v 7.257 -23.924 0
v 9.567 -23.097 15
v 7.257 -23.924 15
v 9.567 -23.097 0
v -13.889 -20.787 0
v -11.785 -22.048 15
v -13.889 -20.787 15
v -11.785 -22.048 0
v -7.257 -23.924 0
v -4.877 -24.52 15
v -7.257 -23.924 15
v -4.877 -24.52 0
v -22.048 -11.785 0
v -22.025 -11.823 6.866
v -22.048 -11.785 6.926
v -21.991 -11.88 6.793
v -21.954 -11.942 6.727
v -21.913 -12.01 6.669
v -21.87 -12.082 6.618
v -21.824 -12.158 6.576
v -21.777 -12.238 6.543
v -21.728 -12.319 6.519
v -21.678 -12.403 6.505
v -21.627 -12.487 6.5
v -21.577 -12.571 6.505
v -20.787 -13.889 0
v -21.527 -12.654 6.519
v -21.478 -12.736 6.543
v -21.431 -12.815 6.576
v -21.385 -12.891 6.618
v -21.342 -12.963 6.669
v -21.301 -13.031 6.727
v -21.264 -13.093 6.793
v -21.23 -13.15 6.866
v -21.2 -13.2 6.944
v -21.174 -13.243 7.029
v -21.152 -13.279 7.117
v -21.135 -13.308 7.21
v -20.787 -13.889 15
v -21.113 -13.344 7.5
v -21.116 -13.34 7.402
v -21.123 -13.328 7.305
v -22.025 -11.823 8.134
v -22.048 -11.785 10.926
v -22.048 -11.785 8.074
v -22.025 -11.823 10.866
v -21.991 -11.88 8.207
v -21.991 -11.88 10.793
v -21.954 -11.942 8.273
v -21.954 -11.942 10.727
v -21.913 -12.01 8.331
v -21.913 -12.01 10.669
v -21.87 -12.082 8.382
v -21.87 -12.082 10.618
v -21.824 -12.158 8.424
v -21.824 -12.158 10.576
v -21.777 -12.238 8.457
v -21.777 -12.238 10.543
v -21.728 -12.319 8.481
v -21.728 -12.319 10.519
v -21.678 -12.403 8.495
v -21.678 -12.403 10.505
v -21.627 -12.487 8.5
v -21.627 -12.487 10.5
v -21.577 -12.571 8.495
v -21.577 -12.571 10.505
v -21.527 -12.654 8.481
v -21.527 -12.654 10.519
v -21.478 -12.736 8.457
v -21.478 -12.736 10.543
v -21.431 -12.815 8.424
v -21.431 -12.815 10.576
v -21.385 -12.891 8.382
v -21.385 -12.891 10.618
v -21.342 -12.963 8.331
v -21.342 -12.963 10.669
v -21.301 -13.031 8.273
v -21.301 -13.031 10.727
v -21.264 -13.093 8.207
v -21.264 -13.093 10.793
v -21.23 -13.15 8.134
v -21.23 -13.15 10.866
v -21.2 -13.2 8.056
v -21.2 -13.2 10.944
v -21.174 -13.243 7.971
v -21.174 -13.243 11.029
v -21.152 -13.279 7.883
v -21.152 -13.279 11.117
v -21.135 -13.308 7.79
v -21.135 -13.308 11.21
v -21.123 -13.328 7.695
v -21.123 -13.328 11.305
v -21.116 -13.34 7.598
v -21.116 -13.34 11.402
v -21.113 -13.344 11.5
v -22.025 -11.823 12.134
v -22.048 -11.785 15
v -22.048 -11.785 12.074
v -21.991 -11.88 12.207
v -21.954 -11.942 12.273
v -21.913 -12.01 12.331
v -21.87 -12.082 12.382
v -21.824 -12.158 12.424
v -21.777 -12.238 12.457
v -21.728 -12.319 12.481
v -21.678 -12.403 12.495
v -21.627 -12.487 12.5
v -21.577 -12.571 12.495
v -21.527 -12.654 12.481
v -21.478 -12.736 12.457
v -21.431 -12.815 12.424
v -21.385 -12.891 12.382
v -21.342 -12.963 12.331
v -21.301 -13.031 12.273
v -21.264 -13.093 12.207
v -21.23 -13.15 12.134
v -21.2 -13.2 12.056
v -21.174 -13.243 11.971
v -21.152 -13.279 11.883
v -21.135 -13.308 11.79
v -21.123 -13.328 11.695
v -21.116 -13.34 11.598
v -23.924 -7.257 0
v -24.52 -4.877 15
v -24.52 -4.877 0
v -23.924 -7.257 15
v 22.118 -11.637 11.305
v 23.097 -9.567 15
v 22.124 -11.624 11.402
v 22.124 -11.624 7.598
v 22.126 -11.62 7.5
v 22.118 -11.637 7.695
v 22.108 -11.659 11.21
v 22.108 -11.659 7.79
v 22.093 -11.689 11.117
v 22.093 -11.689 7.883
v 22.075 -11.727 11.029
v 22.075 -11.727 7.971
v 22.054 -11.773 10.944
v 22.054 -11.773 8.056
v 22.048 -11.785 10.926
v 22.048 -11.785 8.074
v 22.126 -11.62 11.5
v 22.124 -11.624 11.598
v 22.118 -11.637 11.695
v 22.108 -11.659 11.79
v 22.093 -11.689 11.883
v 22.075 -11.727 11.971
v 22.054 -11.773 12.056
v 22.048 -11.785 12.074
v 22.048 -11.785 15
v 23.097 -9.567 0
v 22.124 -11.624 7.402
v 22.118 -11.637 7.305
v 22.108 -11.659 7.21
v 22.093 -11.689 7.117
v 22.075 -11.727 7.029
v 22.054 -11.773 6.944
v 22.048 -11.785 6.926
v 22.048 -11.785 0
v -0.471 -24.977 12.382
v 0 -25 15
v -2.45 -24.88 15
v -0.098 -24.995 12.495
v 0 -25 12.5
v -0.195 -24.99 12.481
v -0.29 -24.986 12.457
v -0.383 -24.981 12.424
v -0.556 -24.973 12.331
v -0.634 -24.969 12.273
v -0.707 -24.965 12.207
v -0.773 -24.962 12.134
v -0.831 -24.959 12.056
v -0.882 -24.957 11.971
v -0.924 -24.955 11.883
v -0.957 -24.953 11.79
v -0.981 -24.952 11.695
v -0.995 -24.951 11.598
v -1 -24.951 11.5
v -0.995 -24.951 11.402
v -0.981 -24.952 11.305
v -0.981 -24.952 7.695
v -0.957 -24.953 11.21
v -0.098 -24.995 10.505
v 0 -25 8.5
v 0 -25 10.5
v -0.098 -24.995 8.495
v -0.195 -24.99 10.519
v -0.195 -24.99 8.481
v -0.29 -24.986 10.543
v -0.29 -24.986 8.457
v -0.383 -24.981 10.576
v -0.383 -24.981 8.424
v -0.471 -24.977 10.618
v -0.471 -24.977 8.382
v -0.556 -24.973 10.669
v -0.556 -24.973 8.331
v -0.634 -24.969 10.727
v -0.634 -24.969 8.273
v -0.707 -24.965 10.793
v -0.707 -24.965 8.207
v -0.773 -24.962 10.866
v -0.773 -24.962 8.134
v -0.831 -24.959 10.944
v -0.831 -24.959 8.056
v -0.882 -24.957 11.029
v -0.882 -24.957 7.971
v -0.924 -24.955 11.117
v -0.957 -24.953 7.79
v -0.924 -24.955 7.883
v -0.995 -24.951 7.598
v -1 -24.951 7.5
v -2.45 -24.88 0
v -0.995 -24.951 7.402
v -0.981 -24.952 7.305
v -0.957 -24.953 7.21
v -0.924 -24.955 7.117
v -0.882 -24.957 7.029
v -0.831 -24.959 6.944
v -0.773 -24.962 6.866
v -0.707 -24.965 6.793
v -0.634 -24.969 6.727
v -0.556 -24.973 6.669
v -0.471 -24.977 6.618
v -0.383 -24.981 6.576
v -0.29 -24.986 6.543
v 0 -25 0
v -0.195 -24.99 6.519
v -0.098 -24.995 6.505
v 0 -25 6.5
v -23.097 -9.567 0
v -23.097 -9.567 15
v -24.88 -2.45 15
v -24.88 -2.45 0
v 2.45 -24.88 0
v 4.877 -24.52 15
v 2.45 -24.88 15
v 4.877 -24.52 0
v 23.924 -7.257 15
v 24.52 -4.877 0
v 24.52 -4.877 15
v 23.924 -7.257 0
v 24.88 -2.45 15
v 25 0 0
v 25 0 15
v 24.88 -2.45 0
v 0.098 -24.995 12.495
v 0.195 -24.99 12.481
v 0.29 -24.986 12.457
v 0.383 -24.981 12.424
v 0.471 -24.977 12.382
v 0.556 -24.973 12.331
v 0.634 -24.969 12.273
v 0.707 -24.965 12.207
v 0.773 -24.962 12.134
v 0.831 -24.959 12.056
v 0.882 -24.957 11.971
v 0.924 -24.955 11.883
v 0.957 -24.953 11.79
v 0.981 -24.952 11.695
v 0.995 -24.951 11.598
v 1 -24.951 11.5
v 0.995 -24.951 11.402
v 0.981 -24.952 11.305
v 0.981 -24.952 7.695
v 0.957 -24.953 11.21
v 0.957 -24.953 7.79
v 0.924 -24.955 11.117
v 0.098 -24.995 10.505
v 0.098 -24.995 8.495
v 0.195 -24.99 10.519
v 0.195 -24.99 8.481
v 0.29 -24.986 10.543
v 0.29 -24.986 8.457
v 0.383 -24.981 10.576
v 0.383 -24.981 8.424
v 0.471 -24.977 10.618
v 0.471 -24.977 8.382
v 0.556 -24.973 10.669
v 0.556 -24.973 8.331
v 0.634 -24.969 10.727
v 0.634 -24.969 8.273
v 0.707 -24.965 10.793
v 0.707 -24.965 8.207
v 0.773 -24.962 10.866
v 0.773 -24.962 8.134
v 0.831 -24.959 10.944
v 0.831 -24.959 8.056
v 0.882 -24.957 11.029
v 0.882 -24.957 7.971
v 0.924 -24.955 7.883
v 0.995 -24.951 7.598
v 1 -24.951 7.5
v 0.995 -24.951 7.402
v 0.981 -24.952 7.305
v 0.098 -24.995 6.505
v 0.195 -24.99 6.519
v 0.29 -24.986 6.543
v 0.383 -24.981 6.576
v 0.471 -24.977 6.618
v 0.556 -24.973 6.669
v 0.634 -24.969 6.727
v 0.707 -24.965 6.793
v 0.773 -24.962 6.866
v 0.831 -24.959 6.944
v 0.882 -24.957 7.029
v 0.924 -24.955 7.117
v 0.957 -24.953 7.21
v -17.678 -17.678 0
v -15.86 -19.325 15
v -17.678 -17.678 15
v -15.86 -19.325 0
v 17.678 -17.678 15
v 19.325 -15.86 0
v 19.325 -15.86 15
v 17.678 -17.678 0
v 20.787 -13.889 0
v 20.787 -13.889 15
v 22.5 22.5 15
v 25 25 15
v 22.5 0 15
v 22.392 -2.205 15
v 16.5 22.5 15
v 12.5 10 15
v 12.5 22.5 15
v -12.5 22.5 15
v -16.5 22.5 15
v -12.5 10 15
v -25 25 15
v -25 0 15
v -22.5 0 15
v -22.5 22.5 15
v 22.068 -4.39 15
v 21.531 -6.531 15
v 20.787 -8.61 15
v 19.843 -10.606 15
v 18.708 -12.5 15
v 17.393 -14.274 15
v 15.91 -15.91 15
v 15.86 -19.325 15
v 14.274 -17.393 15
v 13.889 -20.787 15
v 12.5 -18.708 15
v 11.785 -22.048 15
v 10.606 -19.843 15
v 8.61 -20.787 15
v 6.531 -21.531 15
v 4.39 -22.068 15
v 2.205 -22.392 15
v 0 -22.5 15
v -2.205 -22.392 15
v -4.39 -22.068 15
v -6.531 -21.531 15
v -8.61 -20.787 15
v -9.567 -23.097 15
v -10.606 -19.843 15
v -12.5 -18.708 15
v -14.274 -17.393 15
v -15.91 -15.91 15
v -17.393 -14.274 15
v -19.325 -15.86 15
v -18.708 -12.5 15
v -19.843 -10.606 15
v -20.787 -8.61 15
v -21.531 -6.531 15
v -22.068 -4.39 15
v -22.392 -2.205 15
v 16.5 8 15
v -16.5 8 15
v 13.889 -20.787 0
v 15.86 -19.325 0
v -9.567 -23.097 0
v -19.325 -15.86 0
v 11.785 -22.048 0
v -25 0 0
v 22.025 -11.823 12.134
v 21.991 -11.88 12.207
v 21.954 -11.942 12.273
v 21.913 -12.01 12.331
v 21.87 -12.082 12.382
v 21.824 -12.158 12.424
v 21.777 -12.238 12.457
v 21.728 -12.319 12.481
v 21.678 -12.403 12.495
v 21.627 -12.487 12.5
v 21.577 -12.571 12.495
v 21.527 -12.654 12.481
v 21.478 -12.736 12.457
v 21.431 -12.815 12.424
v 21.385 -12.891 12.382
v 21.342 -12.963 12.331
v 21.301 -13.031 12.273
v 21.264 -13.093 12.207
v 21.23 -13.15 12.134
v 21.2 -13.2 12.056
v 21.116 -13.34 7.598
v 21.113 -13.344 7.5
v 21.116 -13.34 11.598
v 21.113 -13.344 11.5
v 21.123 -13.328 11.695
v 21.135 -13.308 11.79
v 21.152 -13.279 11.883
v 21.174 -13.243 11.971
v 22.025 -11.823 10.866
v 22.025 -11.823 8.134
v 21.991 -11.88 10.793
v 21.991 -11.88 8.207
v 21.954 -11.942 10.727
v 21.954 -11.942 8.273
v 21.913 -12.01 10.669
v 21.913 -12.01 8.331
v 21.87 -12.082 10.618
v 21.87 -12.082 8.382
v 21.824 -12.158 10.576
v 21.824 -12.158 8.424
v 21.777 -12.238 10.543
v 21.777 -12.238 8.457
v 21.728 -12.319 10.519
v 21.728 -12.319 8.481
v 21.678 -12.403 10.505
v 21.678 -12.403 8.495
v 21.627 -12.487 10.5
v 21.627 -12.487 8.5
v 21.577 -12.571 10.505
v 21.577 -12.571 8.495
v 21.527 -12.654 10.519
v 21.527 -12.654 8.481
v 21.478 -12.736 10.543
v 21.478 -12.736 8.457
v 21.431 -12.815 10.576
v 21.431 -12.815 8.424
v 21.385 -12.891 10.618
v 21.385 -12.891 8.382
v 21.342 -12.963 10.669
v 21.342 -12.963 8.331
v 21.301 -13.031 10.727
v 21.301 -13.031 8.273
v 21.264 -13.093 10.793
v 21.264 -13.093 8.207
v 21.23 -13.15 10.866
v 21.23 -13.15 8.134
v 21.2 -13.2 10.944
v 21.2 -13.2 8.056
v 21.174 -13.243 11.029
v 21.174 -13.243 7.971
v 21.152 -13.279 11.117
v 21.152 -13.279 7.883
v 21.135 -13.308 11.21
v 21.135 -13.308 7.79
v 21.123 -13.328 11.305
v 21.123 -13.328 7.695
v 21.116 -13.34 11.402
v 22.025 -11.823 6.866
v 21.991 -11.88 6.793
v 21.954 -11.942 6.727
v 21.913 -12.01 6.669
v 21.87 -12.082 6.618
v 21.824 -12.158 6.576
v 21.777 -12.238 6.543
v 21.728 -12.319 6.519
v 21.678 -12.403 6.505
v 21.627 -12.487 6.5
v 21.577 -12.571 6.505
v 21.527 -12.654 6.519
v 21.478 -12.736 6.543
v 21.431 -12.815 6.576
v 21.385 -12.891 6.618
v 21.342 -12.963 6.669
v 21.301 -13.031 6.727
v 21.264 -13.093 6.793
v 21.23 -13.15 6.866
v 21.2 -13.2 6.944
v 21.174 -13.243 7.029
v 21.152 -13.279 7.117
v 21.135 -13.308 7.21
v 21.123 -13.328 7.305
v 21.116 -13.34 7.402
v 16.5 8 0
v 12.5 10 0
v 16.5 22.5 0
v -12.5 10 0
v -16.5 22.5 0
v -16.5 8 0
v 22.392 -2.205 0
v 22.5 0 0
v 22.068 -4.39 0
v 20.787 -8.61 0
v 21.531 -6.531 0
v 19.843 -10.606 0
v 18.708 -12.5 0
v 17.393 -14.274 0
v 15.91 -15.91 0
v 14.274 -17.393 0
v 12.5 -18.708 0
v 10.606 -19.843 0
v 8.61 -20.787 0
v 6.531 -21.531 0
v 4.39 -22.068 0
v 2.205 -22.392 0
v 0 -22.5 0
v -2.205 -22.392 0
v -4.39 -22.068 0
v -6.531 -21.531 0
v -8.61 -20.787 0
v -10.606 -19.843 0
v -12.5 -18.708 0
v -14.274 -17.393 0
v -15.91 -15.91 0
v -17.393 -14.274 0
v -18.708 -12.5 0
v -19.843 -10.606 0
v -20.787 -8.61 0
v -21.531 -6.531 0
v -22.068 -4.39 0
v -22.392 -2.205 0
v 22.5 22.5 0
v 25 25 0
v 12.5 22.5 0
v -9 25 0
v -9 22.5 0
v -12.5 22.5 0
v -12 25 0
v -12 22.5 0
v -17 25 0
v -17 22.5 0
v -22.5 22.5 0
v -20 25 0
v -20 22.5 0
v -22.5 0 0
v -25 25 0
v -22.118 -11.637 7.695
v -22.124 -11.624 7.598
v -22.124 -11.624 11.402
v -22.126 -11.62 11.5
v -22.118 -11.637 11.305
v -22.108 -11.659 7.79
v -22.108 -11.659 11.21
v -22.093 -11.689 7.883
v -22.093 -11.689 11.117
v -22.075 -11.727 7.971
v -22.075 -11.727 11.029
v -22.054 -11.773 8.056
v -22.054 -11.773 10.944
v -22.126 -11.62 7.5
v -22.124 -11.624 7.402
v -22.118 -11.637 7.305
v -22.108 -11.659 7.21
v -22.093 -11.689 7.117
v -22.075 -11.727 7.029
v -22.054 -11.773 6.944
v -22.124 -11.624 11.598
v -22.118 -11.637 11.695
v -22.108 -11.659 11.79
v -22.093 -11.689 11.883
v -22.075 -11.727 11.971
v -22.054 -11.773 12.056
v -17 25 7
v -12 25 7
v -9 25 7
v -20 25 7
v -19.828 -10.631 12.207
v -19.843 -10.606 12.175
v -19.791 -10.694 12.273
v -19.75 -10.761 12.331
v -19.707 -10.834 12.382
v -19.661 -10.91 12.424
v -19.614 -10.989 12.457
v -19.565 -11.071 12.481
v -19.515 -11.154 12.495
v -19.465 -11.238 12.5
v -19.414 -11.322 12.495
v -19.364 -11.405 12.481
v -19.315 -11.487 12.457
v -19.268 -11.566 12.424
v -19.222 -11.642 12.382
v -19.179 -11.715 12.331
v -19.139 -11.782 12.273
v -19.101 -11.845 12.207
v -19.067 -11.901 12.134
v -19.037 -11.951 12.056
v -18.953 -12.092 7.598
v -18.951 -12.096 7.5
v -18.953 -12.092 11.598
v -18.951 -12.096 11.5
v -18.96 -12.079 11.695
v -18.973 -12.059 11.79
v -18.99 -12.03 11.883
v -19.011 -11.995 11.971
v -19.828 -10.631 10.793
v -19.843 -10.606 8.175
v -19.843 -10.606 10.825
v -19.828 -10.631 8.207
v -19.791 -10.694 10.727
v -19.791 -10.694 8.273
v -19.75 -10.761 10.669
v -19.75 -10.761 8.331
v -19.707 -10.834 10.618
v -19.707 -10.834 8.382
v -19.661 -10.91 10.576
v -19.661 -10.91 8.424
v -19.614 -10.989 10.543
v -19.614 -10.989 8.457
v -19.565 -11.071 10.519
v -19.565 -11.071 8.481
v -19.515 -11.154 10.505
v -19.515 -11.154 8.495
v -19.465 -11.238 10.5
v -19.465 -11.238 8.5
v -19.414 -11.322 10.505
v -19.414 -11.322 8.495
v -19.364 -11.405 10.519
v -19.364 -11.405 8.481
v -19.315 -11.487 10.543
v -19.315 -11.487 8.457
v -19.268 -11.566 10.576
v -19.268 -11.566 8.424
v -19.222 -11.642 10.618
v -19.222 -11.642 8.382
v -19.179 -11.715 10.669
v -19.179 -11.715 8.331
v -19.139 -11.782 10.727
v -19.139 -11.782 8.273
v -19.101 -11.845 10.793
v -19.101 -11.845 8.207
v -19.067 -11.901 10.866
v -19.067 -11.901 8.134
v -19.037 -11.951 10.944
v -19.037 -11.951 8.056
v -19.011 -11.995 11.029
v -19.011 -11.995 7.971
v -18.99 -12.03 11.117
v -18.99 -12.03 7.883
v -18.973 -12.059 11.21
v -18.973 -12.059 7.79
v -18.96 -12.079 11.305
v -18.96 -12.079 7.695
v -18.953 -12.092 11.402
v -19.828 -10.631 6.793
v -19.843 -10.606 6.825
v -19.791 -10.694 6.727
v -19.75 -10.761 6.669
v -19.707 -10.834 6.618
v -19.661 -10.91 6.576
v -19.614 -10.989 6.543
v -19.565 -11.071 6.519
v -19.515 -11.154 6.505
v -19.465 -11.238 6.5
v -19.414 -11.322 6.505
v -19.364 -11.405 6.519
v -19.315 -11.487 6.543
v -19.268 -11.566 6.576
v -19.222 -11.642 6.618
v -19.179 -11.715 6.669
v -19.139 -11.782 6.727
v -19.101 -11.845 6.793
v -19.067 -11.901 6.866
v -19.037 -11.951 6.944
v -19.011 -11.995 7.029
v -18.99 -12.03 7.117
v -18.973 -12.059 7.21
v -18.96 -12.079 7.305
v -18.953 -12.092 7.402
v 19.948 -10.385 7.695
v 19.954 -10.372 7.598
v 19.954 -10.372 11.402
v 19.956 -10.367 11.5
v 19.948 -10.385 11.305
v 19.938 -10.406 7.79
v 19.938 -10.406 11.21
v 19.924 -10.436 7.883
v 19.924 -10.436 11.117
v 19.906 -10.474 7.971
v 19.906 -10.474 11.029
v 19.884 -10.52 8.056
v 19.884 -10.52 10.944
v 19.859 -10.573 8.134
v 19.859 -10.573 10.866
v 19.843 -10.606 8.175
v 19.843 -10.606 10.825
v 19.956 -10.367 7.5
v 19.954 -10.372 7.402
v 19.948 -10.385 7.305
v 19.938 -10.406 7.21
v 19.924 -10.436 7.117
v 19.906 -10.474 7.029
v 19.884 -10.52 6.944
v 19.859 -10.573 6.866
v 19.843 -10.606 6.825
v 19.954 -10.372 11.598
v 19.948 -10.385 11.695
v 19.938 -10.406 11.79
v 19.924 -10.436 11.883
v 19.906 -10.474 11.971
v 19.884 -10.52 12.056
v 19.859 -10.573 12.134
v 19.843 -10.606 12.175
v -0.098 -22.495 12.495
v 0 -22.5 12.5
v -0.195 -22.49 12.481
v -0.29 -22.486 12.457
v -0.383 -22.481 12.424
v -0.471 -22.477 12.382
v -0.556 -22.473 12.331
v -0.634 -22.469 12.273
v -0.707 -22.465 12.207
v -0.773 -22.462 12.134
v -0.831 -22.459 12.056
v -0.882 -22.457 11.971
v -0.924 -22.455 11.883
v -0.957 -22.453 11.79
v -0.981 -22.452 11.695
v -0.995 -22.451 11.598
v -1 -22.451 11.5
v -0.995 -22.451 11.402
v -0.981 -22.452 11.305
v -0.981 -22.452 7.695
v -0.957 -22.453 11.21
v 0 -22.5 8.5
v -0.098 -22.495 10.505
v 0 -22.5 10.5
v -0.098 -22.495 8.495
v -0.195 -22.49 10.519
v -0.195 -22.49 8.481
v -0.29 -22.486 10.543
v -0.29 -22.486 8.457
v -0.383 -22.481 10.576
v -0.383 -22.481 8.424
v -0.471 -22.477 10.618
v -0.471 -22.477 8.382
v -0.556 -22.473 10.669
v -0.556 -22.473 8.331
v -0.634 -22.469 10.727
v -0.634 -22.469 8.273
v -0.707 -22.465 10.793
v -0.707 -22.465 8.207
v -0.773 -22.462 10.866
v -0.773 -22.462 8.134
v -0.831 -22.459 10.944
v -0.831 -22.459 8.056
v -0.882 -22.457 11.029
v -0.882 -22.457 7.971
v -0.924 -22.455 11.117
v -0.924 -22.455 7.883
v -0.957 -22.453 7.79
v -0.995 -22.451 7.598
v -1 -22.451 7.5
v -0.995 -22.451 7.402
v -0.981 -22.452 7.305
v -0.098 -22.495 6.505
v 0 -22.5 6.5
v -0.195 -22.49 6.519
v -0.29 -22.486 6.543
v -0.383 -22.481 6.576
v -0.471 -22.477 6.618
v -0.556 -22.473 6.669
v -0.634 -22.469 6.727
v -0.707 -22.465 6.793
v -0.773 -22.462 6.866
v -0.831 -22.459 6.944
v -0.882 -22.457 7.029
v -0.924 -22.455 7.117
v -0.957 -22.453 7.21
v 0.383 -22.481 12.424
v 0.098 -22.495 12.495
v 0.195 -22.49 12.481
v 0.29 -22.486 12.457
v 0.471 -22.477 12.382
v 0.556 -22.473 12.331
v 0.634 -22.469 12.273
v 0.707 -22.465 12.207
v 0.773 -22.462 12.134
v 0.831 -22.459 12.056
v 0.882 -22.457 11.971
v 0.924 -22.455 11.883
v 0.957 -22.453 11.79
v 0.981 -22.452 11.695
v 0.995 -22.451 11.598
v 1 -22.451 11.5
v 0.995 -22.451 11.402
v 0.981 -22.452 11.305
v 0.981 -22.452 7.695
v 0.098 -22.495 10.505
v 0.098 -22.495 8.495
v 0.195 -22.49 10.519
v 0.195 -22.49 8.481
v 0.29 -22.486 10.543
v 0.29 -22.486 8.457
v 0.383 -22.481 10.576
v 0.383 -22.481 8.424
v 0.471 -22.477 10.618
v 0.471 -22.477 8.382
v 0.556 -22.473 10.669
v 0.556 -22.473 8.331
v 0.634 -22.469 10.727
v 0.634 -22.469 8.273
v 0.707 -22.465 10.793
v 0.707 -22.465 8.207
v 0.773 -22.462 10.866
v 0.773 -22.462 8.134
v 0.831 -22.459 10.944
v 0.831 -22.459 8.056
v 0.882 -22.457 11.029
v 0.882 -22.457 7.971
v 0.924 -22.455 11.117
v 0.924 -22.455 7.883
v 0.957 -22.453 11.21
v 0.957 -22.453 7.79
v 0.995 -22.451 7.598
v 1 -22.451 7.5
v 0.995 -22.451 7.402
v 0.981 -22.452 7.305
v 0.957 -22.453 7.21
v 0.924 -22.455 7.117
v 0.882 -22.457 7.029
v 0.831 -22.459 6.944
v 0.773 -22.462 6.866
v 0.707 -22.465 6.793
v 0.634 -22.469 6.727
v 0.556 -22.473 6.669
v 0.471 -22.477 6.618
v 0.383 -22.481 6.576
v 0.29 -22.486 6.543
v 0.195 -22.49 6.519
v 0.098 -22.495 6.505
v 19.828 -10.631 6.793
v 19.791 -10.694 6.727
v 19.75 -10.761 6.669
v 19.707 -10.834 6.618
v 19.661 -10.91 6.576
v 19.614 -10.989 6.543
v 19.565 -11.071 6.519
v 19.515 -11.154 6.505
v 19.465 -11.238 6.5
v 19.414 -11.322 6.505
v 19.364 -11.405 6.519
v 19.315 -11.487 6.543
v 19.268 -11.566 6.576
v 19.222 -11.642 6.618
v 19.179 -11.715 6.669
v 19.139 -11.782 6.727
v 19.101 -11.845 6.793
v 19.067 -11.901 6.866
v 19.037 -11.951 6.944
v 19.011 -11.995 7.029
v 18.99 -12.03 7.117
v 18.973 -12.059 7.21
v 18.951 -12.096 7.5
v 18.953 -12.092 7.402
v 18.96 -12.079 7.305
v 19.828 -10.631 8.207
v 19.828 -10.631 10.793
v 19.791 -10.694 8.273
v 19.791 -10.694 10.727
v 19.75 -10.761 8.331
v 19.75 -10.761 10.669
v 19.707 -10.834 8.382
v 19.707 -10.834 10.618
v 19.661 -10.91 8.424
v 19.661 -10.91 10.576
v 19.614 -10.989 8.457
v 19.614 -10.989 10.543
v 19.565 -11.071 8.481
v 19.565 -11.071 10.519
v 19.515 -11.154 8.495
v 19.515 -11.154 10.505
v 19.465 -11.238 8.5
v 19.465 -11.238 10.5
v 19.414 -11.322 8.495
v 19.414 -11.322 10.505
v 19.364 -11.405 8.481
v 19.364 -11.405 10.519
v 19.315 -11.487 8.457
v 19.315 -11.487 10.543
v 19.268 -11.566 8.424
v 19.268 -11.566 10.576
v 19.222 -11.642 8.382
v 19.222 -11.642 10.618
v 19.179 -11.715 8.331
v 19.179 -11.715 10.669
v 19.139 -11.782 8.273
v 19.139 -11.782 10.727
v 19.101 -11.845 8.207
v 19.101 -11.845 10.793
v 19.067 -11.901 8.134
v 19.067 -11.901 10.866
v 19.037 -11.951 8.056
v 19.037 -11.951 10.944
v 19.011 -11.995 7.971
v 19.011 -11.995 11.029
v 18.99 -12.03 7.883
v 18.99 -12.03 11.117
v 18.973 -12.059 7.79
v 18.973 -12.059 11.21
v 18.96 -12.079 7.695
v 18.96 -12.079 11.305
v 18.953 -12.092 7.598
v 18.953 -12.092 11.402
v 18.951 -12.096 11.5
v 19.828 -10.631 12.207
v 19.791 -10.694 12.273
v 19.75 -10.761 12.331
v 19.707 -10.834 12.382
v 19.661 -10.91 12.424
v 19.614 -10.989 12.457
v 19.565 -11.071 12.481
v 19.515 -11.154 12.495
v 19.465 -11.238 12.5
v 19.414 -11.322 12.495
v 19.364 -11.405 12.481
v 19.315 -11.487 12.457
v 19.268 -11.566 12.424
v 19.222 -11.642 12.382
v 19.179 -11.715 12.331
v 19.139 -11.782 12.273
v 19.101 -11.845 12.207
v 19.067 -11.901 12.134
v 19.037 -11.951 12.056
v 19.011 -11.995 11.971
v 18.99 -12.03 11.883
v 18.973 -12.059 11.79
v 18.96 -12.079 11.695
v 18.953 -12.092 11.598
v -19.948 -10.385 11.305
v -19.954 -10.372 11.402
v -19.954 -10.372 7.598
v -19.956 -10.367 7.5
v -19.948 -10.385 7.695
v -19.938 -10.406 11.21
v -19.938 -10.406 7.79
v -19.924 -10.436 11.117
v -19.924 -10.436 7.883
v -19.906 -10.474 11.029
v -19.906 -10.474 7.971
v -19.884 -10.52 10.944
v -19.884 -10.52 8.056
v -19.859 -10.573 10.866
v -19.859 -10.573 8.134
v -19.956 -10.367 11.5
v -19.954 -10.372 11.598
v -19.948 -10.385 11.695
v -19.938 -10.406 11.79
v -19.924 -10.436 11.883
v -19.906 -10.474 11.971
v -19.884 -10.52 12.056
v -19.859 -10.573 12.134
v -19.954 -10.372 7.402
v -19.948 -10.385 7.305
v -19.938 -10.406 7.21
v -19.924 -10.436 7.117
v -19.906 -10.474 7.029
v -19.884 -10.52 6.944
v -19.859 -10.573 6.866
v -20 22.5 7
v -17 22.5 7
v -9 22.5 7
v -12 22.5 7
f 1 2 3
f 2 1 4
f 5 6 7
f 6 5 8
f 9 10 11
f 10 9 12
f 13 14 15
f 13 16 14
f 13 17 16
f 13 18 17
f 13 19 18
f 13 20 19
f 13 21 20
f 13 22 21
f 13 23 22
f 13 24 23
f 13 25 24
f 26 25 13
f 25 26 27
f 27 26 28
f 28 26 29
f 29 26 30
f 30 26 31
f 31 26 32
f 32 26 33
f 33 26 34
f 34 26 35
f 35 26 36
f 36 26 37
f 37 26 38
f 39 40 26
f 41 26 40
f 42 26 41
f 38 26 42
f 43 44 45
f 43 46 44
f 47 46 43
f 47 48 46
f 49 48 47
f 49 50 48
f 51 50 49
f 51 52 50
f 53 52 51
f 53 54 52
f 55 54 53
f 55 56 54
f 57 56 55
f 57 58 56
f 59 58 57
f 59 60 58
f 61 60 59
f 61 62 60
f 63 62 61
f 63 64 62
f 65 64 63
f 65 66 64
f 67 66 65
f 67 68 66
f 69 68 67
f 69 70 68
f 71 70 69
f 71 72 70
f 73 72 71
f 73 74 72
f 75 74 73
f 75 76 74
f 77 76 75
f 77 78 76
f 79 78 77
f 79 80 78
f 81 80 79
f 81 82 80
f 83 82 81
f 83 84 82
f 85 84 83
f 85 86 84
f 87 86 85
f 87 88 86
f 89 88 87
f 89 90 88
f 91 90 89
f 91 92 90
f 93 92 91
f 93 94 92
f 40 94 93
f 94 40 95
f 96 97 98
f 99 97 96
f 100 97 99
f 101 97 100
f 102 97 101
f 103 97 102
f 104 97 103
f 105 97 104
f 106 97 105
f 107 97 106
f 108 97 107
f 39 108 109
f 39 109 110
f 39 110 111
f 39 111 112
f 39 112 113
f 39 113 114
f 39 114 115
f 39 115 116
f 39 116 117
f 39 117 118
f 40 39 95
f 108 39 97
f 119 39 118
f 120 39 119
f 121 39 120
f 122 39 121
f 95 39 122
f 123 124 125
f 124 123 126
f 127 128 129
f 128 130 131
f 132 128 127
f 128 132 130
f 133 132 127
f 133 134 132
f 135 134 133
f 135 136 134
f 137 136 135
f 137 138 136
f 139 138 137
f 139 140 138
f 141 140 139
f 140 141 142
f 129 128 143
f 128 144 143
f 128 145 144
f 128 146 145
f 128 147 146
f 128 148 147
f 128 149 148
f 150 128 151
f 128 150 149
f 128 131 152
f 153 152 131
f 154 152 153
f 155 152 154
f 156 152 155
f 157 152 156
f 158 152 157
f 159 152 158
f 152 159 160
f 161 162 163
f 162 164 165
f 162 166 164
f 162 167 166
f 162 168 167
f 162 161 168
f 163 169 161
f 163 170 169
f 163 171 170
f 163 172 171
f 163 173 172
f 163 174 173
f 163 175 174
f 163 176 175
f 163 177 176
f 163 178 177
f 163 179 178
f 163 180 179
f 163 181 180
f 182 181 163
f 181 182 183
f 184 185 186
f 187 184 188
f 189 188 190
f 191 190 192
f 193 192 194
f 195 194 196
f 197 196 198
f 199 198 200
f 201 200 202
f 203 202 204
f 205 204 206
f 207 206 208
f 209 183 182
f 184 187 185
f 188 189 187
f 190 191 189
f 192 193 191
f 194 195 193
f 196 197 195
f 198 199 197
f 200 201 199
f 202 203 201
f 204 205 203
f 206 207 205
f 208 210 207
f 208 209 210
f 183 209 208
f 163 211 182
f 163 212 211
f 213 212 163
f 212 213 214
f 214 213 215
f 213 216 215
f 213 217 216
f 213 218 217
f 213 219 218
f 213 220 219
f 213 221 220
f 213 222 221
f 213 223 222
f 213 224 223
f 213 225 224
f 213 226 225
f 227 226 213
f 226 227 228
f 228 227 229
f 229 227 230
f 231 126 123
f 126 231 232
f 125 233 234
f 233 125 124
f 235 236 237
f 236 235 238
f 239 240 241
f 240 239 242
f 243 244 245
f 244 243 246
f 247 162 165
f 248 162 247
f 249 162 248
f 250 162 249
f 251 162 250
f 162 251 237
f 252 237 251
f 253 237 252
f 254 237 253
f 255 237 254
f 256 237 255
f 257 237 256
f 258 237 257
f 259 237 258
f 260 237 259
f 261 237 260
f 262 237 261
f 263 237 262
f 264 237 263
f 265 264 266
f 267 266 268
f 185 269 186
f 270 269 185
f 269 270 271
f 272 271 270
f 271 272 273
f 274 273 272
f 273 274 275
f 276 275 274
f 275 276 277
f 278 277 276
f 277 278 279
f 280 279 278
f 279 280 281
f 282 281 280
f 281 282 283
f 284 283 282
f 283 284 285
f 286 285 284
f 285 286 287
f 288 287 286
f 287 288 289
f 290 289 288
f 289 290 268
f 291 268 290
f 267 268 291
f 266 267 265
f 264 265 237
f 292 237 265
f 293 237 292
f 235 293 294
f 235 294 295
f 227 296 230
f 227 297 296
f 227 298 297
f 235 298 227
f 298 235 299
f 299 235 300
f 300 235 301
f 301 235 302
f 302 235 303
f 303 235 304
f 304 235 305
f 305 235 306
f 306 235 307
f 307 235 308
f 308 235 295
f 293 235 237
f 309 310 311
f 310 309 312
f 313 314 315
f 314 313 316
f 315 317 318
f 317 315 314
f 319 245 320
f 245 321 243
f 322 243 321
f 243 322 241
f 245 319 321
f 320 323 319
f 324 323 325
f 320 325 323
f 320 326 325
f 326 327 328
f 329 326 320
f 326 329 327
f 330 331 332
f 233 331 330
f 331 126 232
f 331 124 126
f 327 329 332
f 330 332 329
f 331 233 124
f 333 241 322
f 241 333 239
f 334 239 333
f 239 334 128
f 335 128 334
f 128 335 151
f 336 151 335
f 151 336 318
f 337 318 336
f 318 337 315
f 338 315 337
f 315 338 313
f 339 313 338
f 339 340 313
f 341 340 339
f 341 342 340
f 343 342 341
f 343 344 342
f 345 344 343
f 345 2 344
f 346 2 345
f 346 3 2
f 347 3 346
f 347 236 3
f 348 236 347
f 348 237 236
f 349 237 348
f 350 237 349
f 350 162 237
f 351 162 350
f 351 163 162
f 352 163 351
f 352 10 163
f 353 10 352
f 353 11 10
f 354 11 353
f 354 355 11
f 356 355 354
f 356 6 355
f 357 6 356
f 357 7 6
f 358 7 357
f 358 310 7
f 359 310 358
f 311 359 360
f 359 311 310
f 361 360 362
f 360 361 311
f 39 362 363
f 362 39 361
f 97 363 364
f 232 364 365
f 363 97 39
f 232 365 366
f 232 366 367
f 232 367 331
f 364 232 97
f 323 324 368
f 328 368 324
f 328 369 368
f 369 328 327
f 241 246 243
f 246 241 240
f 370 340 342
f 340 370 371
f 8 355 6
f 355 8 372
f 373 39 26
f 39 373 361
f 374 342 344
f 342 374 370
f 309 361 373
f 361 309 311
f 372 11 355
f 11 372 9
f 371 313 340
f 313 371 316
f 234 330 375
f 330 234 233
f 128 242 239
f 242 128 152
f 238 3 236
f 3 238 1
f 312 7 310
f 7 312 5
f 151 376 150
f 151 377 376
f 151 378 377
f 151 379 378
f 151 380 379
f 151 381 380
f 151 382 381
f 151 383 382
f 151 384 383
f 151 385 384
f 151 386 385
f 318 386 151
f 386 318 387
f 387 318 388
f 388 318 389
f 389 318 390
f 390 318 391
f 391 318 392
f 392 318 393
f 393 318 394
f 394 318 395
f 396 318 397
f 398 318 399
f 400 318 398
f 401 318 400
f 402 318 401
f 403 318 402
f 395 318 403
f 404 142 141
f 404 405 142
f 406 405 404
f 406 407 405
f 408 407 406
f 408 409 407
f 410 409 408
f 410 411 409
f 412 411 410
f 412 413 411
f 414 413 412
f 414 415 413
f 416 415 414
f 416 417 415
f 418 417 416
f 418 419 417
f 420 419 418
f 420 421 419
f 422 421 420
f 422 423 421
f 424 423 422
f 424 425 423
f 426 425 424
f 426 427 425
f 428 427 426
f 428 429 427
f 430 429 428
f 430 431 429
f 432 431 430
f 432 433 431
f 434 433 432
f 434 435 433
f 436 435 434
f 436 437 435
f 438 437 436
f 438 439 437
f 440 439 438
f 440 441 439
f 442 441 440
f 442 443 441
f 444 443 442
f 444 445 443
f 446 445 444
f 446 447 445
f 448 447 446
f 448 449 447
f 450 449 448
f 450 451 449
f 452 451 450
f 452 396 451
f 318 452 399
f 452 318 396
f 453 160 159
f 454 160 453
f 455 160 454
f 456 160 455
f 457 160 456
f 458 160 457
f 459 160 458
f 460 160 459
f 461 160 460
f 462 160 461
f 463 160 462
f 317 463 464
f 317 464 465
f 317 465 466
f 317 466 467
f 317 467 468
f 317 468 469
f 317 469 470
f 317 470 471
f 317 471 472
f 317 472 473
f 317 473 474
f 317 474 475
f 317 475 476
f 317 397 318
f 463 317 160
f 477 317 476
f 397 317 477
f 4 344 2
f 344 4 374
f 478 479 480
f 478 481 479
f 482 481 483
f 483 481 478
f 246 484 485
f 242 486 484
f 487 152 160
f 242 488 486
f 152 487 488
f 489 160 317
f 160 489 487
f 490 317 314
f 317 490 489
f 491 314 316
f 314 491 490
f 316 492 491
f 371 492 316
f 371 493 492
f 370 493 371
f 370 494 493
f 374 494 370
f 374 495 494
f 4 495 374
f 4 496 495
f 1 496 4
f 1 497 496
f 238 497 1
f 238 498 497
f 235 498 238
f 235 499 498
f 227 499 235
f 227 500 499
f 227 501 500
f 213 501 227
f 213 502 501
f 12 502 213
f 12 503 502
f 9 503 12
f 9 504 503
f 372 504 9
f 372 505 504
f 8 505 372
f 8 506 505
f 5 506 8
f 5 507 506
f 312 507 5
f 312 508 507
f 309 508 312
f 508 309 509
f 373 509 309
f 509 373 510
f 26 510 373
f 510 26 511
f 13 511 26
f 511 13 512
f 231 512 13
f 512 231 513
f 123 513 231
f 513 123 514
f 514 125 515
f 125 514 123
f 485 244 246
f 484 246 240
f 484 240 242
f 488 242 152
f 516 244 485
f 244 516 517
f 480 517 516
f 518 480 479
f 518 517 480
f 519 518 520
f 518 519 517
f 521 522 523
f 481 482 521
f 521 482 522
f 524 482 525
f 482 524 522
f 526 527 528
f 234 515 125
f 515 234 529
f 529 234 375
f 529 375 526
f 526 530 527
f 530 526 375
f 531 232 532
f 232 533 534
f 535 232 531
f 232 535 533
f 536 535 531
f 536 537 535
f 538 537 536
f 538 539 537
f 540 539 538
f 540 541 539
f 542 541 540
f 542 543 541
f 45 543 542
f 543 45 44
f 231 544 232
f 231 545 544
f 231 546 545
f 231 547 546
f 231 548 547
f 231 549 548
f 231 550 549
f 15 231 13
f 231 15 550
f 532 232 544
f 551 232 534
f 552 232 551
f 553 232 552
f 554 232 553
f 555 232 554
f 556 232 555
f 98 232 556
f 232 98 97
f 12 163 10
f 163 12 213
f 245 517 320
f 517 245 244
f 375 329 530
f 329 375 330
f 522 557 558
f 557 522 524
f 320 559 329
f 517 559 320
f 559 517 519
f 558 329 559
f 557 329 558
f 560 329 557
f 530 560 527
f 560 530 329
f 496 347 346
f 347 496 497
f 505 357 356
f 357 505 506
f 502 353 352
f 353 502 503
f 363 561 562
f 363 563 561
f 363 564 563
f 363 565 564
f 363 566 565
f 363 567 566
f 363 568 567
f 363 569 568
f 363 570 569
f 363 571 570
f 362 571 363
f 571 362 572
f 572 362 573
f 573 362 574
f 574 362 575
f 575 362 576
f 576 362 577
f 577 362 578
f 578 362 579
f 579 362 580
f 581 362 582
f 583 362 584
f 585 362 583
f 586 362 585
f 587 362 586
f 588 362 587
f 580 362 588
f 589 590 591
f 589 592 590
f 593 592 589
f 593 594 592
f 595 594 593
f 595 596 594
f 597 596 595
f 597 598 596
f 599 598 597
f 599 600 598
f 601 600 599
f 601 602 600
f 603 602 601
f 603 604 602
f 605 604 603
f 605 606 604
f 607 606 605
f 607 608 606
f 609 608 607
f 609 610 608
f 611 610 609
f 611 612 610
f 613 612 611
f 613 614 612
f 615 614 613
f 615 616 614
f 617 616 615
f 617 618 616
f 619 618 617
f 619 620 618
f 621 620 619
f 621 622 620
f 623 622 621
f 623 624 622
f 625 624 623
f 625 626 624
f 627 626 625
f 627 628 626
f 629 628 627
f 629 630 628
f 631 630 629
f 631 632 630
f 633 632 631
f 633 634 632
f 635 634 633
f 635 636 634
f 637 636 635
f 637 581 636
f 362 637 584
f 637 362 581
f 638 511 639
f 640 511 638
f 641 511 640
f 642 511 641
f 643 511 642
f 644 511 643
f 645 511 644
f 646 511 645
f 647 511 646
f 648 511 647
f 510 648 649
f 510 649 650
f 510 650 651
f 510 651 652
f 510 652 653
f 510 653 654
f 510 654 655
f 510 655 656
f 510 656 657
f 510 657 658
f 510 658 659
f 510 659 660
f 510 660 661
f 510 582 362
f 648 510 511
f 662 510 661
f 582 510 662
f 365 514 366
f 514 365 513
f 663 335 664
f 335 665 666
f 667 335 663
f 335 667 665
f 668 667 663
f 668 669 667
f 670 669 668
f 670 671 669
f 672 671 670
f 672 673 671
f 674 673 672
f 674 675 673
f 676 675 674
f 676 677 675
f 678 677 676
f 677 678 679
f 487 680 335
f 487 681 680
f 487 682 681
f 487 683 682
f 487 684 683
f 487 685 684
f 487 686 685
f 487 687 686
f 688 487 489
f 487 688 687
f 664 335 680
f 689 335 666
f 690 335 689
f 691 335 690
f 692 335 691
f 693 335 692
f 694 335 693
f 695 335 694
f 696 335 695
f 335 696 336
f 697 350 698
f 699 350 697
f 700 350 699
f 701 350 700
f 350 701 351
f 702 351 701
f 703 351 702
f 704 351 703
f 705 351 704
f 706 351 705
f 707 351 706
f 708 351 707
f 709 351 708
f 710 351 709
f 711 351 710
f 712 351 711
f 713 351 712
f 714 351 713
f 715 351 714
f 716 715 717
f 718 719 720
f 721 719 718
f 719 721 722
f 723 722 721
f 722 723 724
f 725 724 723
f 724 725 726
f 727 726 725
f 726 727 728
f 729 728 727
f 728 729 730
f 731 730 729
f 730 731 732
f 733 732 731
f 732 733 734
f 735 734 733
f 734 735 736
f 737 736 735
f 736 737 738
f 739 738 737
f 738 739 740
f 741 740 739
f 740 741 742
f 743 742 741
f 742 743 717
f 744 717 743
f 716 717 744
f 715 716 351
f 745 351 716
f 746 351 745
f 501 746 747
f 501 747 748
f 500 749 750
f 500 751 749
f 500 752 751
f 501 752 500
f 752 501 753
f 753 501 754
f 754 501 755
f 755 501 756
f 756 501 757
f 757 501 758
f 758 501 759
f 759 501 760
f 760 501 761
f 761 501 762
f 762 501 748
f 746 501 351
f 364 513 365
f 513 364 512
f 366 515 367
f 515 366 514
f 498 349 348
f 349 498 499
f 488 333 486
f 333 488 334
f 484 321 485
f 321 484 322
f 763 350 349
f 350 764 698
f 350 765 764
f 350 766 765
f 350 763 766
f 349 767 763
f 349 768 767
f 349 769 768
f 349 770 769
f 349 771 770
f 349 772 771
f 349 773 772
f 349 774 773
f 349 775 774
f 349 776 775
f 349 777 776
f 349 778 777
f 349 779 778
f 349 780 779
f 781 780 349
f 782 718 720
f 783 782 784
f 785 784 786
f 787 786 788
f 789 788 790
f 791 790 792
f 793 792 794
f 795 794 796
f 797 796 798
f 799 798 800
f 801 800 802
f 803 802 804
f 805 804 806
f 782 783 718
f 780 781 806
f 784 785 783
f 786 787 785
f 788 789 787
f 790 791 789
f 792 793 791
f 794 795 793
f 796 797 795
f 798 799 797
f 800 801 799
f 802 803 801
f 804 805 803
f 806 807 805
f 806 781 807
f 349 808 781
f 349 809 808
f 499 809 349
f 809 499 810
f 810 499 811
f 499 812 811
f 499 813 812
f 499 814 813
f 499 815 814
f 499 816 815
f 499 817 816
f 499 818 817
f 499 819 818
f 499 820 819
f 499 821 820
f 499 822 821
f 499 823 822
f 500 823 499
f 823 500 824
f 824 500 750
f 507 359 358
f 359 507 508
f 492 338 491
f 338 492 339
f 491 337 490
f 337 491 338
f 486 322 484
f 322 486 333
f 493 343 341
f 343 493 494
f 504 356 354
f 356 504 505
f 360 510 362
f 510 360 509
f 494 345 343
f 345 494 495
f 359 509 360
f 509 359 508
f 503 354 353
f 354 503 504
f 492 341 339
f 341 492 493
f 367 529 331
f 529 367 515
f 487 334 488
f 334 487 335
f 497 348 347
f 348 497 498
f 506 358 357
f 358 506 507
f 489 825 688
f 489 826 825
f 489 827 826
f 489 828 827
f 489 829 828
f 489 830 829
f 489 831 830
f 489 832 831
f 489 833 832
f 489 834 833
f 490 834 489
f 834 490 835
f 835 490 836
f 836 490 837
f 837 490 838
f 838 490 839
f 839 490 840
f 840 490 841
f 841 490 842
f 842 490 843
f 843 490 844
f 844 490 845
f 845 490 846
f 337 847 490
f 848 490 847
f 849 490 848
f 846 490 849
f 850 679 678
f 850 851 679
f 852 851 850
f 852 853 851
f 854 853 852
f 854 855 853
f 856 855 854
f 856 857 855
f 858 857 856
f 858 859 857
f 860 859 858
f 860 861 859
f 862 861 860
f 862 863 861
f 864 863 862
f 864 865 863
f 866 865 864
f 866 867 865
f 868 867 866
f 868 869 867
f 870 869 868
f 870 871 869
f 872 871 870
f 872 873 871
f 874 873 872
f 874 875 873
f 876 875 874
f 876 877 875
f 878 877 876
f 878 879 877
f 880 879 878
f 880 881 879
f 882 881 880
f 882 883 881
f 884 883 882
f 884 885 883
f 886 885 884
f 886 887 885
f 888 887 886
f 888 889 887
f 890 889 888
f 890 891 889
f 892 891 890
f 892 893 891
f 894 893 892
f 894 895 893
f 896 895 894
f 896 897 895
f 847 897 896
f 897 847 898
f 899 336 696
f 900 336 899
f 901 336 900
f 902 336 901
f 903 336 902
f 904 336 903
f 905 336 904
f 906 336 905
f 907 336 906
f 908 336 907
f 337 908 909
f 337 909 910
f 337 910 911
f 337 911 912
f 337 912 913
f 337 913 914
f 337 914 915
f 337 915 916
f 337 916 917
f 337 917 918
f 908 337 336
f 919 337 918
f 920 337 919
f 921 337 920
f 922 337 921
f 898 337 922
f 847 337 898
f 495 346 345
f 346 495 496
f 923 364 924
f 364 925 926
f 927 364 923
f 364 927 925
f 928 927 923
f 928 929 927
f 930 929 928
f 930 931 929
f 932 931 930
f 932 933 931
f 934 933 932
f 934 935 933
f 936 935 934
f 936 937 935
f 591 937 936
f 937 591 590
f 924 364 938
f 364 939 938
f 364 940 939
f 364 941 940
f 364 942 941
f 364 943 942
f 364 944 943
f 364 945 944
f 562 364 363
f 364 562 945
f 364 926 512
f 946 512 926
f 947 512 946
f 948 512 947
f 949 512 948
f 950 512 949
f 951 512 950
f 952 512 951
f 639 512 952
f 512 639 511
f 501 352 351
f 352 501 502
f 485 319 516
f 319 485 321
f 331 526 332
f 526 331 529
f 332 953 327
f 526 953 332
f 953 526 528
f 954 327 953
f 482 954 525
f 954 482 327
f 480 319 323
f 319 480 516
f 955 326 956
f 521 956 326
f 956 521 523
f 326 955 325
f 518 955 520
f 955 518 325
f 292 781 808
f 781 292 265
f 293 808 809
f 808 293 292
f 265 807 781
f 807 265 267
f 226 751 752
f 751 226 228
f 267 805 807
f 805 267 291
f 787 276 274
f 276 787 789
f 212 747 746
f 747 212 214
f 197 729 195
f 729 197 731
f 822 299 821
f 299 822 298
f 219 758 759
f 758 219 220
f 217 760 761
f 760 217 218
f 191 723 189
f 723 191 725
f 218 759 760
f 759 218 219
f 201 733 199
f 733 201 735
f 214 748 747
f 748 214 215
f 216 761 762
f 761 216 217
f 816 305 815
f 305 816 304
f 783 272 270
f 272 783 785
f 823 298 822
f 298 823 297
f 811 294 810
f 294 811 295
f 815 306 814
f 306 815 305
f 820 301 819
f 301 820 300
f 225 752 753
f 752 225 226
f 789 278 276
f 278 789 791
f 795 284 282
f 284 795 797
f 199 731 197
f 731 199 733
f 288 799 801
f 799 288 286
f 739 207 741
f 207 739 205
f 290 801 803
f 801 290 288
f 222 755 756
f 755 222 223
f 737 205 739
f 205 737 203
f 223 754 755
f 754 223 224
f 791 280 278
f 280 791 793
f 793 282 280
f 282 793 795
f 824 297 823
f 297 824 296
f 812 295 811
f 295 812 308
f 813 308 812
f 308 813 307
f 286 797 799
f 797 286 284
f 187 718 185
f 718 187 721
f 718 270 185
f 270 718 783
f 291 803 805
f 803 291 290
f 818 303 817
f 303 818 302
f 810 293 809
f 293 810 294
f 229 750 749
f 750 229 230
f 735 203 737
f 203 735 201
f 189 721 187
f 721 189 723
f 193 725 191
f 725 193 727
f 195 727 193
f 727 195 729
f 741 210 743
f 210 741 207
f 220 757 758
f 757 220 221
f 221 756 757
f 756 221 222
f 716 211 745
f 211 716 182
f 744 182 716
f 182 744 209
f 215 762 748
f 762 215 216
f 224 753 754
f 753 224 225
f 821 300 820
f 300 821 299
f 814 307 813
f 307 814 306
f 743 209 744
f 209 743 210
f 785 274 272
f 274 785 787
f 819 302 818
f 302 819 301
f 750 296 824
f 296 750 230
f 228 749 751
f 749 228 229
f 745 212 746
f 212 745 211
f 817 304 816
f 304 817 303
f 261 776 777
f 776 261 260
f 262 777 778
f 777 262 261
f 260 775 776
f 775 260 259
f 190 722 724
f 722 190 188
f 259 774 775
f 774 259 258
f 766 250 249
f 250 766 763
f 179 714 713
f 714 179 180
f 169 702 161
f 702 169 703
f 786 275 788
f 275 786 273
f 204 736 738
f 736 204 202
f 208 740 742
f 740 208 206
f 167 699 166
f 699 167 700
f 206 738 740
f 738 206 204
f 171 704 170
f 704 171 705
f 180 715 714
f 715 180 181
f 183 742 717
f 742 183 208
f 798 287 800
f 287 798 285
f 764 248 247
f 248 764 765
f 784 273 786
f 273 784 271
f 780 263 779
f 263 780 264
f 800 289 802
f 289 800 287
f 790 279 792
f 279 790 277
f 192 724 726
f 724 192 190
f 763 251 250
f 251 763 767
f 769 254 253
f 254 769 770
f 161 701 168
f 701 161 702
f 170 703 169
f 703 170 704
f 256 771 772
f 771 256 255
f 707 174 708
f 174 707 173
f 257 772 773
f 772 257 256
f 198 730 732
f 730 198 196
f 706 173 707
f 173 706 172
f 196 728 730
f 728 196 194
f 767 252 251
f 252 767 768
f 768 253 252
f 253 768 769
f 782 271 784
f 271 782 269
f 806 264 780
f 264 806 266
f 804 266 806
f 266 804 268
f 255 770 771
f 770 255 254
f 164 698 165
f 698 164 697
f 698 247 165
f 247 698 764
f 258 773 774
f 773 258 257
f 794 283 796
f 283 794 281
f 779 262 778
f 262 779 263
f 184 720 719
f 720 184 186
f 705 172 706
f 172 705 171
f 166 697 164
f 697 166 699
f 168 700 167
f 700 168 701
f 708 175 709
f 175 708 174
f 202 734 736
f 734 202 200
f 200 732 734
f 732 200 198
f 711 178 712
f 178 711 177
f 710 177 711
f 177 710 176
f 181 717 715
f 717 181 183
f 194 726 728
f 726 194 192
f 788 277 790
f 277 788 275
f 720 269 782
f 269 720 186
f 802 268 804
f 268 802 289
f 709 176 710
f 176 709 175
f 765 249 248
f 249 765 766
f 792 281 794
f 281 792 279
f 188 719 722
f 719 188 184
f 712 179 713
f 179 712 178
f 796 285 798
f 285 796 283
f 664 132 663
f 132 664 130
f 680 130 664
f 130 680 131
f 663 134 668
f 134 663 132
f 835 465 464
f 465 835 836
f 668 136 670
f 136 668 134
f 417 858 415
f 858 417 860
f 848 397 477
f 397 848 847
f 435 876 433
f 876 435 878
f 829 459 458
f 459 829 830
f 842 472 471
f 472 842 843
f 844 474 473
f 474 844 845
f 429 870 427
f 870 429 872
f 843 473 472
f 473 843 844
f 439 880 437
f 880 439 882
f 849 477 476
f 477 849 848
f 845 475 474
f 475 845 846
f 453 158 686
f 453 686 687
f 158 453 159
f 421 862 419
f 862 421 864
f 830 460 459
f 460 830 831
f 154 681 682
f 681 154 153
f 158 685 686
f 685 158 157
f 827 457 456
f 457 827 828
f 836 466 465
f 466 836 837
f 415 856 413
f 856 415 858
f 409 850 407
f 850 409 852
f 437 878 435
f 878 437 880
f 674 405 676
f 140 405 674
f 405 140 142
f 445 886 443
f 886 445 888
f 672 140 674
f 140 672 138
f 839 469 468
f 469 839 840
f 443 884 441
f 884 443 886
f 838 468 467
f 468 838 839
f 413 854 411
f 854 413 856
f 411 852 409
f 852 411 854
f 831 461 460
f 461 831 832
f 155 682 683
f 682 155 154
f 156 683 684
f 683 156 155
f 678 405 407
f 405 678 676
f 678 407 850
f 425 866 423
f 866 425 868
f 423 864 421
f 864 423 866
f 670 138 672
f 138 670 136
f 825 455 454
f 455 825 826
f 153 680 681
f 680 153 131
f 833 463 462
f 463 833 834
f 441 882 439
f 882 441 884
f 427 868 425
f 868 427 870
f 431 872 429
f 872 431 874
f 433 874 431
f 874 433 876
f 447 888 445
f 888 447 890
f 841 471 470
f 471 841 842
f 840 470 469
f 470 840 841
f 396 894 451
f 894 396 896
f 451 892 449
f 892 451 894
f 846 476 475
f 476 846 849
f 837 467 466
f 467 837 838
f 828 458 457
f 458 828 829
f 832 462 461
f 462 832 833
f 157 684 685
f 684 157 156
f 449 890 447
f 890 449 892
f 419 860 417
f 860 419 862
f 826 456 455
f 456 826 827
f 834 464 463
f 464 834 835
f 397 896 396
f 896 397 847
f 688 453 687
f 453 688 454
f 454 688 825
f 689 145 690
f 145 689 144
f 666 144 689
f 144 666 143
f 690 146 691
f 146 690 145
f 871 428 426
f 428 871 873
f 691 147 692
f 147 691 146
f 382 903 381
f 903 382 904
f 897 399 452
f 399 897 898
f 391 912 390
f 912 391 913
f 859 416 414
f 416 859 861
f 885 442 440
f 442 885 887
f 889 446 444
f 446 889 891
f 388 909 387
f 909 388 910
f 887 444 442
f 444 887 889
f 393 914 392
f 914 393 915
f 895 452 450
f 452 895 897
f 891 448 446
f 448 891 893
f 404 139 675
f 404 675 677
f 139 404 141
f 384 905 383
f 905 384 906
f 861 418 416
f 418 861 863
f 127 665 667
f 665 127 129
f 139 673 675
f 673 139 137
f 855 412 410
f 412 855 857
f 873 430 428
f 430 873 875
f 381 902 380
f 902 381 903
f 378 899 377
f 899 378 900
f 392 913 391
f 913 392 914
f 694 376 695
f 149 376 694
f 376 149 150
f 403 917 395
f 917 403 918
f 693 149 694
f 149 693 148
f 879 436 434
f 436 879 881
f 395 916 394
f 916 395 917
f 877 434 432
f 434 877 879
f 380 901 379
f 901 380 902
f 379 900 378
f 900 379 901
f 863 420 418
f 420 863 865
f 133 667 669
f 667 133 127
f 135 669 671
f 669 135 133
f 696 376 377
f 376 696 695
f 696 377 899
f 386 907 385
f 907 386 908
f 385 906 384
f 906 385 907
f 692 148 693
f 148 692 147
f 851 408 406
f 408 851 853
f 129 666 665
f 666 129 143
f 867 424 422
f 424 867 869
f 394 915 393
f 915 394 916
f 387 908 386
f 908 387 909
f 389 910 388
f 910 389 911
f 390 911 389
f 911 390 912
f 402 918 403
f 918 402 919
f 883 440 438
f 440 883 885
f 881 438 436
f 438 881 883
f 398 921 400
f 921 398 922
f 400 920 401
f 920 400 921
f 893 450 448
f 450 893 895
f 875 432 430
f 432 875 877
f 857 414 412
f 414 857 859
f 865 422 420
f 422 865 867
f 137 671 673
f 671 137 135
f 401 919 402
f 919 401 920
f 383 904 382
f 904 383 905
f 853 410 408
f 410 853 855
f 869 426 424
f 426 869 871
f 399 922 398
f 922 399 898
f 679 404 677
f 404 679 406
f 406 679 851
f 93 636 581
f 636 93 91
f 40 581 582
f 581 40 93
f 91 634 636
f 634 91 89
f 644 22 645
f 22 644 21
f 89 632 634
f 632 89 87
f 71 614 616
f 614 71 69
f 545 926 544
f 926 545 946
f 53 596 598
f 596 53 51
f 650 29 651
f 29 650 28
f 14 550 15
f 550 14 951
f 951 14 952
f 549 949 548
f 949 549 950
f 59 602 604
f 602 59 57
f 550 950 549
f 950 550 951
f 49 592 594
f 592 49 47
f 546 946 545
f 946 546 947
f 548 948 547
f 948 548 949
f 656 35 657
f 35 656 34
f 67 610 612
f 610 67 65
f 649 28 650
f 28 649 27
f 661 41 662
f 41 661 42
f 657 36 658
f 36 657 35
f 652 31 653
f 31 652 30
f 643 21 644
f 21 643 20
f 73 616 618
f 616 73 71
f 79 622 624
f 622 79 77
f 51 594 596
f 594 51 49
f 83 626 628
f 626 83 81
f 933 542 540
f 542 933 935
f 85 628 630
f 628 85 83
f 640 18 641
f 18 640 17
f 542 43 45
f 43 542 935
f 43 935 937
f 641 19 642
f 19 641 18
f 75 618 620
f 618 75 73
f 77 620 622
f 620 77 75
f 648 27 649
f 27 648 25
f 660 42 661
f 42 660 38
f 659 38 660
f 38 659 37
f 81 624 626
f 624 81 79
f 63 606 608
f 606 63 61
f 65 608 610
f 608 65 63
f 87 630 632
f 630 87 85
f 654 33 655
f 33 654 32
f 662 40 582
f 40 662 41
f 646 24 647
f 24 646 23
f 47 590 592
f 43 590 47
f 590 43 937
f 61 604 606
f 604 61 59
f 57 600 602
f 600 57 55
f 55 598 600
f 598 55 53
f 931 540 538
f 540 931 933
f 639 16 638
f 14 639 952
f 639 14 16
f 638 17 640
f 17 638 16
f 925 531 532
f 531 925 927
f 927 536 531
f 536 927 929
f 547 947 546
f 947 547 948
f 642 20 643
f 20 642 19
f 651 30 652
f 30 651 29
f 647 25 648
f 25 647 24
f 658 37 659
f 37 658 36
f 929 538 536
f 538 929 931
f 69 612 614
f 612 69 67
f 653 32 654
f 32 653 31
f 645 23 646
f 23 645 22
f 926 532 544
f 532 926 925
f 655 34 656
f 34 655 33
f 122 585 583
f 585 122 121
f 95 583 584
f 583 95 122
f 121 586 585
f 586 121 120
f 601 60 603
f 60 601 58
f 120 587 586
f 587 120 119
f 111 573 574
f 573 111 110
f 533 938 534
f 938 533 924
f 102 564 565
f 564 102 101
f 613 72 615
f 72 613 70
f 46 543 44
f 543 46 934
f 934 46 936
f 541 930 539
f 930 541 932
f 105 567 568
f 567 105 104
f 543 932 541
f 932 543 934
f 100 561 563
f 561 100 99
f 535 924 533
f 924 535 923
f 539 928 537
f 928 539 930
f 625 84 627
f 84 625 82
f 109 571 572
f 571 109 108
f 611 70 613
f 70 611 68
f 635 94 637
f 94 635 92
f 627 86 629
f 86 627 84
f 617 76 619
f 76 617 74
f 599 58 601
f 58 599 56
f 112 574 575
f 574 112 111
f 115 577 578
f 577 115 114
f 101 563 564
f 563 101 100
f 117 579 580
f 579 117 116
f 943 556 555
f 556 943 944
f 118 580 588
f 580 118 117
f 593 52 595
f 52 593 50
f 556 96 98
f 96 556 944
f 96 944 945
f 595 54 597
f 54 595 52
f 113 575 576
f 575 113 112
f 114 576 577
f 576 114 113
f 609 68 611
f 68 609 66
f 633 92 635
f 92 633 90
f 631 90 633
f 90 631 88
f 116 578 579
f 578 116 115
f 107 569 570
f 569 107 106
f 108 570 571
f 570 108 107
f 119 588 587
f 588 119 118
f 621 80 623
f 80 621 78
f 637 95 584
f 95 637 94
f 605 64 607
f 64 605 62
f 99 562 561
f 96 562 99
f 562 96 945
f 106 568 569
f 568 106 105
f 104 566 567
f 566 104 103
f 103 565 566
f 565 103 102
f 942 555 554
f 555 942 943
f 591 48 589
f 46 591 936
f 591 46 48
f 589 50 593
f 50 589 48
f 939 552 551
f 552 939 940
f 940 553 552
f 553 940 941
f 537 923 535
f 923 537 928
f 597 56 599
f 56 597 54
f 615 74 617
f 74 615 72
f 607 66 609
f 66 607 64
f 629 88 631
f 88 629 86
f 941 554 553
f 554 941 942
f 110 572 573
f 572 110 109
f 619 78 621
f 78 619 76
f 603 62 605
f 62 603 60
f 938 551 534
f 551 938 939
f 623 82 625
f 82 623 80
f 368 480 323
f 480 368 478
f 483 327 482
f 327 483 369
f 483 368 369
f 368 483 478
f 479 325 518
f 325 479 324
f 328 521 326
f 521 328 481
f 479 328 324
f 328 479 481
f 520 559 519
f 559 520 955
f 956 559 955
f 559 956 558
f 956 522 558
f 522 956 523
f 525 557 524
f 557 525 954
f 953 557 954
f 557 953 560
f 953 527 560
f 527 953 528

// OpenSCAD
$fn=64;

$base_v = 15;
$base_h = 50;



module base_shape(base_width, base_height) {
    union() {
        cylinder(r=base_width/2, h=base_height);
        translate([-base_width/2,0,0]) {
            cube([base_width, base_width/2, base_height]);
        }
    }
}

module sensor_holes(altitude, offset) {
    translate([0,offset,altitude-2]) {
        rotate([90,0,0]) {
            cylinder(r=1, h=50);
        }
    }
    translate([0,offset,altitude+2]) {
        rotate([90,0,0]) {
            cylinder(r=1, h=50);
        }
    }  
}

module servo_slot(height) {
       difference() {
           cube([33,16,height]);
           translate([4,2,-1]) {
               cube([25,13,height+2]);
           }
       } 
}

module wire_ports() {
        // wire ports
        translate([-12,0,0]) {
            cube([3,9,8]);
        }
        translate([-20,0,0]) {
             cube([3,9,8]);           
        }
    
}

module main_build() {
    difference() {
        union() {
            difference() {
               base_shape($base_h, $base_v);
               translate([0,0,5]) {
                    scale(0.90) {
                        base_shape($base_h, $base_v);
                    }
                }
               translate([0,0,-1]) {
                    scale(0.90) {
                        base_shape($base_h, $base_v);
                    }
               }
               sensor_holes($base_v/2+2,-15);
               rotate([0,0,60]) {
                   sensor_holes($base_v/2+2,-15);
               }
                rotate([0,0,-60]) {
                   sensor_holes($base_v/2+2,-15);
               }      
            }
            translate([-16.5,8,0]) {
                servo_slot($base_v);
            }
        }
        translate([0,18,-1]) {
            wire_ports();
        } 
    }
}


main_build();
